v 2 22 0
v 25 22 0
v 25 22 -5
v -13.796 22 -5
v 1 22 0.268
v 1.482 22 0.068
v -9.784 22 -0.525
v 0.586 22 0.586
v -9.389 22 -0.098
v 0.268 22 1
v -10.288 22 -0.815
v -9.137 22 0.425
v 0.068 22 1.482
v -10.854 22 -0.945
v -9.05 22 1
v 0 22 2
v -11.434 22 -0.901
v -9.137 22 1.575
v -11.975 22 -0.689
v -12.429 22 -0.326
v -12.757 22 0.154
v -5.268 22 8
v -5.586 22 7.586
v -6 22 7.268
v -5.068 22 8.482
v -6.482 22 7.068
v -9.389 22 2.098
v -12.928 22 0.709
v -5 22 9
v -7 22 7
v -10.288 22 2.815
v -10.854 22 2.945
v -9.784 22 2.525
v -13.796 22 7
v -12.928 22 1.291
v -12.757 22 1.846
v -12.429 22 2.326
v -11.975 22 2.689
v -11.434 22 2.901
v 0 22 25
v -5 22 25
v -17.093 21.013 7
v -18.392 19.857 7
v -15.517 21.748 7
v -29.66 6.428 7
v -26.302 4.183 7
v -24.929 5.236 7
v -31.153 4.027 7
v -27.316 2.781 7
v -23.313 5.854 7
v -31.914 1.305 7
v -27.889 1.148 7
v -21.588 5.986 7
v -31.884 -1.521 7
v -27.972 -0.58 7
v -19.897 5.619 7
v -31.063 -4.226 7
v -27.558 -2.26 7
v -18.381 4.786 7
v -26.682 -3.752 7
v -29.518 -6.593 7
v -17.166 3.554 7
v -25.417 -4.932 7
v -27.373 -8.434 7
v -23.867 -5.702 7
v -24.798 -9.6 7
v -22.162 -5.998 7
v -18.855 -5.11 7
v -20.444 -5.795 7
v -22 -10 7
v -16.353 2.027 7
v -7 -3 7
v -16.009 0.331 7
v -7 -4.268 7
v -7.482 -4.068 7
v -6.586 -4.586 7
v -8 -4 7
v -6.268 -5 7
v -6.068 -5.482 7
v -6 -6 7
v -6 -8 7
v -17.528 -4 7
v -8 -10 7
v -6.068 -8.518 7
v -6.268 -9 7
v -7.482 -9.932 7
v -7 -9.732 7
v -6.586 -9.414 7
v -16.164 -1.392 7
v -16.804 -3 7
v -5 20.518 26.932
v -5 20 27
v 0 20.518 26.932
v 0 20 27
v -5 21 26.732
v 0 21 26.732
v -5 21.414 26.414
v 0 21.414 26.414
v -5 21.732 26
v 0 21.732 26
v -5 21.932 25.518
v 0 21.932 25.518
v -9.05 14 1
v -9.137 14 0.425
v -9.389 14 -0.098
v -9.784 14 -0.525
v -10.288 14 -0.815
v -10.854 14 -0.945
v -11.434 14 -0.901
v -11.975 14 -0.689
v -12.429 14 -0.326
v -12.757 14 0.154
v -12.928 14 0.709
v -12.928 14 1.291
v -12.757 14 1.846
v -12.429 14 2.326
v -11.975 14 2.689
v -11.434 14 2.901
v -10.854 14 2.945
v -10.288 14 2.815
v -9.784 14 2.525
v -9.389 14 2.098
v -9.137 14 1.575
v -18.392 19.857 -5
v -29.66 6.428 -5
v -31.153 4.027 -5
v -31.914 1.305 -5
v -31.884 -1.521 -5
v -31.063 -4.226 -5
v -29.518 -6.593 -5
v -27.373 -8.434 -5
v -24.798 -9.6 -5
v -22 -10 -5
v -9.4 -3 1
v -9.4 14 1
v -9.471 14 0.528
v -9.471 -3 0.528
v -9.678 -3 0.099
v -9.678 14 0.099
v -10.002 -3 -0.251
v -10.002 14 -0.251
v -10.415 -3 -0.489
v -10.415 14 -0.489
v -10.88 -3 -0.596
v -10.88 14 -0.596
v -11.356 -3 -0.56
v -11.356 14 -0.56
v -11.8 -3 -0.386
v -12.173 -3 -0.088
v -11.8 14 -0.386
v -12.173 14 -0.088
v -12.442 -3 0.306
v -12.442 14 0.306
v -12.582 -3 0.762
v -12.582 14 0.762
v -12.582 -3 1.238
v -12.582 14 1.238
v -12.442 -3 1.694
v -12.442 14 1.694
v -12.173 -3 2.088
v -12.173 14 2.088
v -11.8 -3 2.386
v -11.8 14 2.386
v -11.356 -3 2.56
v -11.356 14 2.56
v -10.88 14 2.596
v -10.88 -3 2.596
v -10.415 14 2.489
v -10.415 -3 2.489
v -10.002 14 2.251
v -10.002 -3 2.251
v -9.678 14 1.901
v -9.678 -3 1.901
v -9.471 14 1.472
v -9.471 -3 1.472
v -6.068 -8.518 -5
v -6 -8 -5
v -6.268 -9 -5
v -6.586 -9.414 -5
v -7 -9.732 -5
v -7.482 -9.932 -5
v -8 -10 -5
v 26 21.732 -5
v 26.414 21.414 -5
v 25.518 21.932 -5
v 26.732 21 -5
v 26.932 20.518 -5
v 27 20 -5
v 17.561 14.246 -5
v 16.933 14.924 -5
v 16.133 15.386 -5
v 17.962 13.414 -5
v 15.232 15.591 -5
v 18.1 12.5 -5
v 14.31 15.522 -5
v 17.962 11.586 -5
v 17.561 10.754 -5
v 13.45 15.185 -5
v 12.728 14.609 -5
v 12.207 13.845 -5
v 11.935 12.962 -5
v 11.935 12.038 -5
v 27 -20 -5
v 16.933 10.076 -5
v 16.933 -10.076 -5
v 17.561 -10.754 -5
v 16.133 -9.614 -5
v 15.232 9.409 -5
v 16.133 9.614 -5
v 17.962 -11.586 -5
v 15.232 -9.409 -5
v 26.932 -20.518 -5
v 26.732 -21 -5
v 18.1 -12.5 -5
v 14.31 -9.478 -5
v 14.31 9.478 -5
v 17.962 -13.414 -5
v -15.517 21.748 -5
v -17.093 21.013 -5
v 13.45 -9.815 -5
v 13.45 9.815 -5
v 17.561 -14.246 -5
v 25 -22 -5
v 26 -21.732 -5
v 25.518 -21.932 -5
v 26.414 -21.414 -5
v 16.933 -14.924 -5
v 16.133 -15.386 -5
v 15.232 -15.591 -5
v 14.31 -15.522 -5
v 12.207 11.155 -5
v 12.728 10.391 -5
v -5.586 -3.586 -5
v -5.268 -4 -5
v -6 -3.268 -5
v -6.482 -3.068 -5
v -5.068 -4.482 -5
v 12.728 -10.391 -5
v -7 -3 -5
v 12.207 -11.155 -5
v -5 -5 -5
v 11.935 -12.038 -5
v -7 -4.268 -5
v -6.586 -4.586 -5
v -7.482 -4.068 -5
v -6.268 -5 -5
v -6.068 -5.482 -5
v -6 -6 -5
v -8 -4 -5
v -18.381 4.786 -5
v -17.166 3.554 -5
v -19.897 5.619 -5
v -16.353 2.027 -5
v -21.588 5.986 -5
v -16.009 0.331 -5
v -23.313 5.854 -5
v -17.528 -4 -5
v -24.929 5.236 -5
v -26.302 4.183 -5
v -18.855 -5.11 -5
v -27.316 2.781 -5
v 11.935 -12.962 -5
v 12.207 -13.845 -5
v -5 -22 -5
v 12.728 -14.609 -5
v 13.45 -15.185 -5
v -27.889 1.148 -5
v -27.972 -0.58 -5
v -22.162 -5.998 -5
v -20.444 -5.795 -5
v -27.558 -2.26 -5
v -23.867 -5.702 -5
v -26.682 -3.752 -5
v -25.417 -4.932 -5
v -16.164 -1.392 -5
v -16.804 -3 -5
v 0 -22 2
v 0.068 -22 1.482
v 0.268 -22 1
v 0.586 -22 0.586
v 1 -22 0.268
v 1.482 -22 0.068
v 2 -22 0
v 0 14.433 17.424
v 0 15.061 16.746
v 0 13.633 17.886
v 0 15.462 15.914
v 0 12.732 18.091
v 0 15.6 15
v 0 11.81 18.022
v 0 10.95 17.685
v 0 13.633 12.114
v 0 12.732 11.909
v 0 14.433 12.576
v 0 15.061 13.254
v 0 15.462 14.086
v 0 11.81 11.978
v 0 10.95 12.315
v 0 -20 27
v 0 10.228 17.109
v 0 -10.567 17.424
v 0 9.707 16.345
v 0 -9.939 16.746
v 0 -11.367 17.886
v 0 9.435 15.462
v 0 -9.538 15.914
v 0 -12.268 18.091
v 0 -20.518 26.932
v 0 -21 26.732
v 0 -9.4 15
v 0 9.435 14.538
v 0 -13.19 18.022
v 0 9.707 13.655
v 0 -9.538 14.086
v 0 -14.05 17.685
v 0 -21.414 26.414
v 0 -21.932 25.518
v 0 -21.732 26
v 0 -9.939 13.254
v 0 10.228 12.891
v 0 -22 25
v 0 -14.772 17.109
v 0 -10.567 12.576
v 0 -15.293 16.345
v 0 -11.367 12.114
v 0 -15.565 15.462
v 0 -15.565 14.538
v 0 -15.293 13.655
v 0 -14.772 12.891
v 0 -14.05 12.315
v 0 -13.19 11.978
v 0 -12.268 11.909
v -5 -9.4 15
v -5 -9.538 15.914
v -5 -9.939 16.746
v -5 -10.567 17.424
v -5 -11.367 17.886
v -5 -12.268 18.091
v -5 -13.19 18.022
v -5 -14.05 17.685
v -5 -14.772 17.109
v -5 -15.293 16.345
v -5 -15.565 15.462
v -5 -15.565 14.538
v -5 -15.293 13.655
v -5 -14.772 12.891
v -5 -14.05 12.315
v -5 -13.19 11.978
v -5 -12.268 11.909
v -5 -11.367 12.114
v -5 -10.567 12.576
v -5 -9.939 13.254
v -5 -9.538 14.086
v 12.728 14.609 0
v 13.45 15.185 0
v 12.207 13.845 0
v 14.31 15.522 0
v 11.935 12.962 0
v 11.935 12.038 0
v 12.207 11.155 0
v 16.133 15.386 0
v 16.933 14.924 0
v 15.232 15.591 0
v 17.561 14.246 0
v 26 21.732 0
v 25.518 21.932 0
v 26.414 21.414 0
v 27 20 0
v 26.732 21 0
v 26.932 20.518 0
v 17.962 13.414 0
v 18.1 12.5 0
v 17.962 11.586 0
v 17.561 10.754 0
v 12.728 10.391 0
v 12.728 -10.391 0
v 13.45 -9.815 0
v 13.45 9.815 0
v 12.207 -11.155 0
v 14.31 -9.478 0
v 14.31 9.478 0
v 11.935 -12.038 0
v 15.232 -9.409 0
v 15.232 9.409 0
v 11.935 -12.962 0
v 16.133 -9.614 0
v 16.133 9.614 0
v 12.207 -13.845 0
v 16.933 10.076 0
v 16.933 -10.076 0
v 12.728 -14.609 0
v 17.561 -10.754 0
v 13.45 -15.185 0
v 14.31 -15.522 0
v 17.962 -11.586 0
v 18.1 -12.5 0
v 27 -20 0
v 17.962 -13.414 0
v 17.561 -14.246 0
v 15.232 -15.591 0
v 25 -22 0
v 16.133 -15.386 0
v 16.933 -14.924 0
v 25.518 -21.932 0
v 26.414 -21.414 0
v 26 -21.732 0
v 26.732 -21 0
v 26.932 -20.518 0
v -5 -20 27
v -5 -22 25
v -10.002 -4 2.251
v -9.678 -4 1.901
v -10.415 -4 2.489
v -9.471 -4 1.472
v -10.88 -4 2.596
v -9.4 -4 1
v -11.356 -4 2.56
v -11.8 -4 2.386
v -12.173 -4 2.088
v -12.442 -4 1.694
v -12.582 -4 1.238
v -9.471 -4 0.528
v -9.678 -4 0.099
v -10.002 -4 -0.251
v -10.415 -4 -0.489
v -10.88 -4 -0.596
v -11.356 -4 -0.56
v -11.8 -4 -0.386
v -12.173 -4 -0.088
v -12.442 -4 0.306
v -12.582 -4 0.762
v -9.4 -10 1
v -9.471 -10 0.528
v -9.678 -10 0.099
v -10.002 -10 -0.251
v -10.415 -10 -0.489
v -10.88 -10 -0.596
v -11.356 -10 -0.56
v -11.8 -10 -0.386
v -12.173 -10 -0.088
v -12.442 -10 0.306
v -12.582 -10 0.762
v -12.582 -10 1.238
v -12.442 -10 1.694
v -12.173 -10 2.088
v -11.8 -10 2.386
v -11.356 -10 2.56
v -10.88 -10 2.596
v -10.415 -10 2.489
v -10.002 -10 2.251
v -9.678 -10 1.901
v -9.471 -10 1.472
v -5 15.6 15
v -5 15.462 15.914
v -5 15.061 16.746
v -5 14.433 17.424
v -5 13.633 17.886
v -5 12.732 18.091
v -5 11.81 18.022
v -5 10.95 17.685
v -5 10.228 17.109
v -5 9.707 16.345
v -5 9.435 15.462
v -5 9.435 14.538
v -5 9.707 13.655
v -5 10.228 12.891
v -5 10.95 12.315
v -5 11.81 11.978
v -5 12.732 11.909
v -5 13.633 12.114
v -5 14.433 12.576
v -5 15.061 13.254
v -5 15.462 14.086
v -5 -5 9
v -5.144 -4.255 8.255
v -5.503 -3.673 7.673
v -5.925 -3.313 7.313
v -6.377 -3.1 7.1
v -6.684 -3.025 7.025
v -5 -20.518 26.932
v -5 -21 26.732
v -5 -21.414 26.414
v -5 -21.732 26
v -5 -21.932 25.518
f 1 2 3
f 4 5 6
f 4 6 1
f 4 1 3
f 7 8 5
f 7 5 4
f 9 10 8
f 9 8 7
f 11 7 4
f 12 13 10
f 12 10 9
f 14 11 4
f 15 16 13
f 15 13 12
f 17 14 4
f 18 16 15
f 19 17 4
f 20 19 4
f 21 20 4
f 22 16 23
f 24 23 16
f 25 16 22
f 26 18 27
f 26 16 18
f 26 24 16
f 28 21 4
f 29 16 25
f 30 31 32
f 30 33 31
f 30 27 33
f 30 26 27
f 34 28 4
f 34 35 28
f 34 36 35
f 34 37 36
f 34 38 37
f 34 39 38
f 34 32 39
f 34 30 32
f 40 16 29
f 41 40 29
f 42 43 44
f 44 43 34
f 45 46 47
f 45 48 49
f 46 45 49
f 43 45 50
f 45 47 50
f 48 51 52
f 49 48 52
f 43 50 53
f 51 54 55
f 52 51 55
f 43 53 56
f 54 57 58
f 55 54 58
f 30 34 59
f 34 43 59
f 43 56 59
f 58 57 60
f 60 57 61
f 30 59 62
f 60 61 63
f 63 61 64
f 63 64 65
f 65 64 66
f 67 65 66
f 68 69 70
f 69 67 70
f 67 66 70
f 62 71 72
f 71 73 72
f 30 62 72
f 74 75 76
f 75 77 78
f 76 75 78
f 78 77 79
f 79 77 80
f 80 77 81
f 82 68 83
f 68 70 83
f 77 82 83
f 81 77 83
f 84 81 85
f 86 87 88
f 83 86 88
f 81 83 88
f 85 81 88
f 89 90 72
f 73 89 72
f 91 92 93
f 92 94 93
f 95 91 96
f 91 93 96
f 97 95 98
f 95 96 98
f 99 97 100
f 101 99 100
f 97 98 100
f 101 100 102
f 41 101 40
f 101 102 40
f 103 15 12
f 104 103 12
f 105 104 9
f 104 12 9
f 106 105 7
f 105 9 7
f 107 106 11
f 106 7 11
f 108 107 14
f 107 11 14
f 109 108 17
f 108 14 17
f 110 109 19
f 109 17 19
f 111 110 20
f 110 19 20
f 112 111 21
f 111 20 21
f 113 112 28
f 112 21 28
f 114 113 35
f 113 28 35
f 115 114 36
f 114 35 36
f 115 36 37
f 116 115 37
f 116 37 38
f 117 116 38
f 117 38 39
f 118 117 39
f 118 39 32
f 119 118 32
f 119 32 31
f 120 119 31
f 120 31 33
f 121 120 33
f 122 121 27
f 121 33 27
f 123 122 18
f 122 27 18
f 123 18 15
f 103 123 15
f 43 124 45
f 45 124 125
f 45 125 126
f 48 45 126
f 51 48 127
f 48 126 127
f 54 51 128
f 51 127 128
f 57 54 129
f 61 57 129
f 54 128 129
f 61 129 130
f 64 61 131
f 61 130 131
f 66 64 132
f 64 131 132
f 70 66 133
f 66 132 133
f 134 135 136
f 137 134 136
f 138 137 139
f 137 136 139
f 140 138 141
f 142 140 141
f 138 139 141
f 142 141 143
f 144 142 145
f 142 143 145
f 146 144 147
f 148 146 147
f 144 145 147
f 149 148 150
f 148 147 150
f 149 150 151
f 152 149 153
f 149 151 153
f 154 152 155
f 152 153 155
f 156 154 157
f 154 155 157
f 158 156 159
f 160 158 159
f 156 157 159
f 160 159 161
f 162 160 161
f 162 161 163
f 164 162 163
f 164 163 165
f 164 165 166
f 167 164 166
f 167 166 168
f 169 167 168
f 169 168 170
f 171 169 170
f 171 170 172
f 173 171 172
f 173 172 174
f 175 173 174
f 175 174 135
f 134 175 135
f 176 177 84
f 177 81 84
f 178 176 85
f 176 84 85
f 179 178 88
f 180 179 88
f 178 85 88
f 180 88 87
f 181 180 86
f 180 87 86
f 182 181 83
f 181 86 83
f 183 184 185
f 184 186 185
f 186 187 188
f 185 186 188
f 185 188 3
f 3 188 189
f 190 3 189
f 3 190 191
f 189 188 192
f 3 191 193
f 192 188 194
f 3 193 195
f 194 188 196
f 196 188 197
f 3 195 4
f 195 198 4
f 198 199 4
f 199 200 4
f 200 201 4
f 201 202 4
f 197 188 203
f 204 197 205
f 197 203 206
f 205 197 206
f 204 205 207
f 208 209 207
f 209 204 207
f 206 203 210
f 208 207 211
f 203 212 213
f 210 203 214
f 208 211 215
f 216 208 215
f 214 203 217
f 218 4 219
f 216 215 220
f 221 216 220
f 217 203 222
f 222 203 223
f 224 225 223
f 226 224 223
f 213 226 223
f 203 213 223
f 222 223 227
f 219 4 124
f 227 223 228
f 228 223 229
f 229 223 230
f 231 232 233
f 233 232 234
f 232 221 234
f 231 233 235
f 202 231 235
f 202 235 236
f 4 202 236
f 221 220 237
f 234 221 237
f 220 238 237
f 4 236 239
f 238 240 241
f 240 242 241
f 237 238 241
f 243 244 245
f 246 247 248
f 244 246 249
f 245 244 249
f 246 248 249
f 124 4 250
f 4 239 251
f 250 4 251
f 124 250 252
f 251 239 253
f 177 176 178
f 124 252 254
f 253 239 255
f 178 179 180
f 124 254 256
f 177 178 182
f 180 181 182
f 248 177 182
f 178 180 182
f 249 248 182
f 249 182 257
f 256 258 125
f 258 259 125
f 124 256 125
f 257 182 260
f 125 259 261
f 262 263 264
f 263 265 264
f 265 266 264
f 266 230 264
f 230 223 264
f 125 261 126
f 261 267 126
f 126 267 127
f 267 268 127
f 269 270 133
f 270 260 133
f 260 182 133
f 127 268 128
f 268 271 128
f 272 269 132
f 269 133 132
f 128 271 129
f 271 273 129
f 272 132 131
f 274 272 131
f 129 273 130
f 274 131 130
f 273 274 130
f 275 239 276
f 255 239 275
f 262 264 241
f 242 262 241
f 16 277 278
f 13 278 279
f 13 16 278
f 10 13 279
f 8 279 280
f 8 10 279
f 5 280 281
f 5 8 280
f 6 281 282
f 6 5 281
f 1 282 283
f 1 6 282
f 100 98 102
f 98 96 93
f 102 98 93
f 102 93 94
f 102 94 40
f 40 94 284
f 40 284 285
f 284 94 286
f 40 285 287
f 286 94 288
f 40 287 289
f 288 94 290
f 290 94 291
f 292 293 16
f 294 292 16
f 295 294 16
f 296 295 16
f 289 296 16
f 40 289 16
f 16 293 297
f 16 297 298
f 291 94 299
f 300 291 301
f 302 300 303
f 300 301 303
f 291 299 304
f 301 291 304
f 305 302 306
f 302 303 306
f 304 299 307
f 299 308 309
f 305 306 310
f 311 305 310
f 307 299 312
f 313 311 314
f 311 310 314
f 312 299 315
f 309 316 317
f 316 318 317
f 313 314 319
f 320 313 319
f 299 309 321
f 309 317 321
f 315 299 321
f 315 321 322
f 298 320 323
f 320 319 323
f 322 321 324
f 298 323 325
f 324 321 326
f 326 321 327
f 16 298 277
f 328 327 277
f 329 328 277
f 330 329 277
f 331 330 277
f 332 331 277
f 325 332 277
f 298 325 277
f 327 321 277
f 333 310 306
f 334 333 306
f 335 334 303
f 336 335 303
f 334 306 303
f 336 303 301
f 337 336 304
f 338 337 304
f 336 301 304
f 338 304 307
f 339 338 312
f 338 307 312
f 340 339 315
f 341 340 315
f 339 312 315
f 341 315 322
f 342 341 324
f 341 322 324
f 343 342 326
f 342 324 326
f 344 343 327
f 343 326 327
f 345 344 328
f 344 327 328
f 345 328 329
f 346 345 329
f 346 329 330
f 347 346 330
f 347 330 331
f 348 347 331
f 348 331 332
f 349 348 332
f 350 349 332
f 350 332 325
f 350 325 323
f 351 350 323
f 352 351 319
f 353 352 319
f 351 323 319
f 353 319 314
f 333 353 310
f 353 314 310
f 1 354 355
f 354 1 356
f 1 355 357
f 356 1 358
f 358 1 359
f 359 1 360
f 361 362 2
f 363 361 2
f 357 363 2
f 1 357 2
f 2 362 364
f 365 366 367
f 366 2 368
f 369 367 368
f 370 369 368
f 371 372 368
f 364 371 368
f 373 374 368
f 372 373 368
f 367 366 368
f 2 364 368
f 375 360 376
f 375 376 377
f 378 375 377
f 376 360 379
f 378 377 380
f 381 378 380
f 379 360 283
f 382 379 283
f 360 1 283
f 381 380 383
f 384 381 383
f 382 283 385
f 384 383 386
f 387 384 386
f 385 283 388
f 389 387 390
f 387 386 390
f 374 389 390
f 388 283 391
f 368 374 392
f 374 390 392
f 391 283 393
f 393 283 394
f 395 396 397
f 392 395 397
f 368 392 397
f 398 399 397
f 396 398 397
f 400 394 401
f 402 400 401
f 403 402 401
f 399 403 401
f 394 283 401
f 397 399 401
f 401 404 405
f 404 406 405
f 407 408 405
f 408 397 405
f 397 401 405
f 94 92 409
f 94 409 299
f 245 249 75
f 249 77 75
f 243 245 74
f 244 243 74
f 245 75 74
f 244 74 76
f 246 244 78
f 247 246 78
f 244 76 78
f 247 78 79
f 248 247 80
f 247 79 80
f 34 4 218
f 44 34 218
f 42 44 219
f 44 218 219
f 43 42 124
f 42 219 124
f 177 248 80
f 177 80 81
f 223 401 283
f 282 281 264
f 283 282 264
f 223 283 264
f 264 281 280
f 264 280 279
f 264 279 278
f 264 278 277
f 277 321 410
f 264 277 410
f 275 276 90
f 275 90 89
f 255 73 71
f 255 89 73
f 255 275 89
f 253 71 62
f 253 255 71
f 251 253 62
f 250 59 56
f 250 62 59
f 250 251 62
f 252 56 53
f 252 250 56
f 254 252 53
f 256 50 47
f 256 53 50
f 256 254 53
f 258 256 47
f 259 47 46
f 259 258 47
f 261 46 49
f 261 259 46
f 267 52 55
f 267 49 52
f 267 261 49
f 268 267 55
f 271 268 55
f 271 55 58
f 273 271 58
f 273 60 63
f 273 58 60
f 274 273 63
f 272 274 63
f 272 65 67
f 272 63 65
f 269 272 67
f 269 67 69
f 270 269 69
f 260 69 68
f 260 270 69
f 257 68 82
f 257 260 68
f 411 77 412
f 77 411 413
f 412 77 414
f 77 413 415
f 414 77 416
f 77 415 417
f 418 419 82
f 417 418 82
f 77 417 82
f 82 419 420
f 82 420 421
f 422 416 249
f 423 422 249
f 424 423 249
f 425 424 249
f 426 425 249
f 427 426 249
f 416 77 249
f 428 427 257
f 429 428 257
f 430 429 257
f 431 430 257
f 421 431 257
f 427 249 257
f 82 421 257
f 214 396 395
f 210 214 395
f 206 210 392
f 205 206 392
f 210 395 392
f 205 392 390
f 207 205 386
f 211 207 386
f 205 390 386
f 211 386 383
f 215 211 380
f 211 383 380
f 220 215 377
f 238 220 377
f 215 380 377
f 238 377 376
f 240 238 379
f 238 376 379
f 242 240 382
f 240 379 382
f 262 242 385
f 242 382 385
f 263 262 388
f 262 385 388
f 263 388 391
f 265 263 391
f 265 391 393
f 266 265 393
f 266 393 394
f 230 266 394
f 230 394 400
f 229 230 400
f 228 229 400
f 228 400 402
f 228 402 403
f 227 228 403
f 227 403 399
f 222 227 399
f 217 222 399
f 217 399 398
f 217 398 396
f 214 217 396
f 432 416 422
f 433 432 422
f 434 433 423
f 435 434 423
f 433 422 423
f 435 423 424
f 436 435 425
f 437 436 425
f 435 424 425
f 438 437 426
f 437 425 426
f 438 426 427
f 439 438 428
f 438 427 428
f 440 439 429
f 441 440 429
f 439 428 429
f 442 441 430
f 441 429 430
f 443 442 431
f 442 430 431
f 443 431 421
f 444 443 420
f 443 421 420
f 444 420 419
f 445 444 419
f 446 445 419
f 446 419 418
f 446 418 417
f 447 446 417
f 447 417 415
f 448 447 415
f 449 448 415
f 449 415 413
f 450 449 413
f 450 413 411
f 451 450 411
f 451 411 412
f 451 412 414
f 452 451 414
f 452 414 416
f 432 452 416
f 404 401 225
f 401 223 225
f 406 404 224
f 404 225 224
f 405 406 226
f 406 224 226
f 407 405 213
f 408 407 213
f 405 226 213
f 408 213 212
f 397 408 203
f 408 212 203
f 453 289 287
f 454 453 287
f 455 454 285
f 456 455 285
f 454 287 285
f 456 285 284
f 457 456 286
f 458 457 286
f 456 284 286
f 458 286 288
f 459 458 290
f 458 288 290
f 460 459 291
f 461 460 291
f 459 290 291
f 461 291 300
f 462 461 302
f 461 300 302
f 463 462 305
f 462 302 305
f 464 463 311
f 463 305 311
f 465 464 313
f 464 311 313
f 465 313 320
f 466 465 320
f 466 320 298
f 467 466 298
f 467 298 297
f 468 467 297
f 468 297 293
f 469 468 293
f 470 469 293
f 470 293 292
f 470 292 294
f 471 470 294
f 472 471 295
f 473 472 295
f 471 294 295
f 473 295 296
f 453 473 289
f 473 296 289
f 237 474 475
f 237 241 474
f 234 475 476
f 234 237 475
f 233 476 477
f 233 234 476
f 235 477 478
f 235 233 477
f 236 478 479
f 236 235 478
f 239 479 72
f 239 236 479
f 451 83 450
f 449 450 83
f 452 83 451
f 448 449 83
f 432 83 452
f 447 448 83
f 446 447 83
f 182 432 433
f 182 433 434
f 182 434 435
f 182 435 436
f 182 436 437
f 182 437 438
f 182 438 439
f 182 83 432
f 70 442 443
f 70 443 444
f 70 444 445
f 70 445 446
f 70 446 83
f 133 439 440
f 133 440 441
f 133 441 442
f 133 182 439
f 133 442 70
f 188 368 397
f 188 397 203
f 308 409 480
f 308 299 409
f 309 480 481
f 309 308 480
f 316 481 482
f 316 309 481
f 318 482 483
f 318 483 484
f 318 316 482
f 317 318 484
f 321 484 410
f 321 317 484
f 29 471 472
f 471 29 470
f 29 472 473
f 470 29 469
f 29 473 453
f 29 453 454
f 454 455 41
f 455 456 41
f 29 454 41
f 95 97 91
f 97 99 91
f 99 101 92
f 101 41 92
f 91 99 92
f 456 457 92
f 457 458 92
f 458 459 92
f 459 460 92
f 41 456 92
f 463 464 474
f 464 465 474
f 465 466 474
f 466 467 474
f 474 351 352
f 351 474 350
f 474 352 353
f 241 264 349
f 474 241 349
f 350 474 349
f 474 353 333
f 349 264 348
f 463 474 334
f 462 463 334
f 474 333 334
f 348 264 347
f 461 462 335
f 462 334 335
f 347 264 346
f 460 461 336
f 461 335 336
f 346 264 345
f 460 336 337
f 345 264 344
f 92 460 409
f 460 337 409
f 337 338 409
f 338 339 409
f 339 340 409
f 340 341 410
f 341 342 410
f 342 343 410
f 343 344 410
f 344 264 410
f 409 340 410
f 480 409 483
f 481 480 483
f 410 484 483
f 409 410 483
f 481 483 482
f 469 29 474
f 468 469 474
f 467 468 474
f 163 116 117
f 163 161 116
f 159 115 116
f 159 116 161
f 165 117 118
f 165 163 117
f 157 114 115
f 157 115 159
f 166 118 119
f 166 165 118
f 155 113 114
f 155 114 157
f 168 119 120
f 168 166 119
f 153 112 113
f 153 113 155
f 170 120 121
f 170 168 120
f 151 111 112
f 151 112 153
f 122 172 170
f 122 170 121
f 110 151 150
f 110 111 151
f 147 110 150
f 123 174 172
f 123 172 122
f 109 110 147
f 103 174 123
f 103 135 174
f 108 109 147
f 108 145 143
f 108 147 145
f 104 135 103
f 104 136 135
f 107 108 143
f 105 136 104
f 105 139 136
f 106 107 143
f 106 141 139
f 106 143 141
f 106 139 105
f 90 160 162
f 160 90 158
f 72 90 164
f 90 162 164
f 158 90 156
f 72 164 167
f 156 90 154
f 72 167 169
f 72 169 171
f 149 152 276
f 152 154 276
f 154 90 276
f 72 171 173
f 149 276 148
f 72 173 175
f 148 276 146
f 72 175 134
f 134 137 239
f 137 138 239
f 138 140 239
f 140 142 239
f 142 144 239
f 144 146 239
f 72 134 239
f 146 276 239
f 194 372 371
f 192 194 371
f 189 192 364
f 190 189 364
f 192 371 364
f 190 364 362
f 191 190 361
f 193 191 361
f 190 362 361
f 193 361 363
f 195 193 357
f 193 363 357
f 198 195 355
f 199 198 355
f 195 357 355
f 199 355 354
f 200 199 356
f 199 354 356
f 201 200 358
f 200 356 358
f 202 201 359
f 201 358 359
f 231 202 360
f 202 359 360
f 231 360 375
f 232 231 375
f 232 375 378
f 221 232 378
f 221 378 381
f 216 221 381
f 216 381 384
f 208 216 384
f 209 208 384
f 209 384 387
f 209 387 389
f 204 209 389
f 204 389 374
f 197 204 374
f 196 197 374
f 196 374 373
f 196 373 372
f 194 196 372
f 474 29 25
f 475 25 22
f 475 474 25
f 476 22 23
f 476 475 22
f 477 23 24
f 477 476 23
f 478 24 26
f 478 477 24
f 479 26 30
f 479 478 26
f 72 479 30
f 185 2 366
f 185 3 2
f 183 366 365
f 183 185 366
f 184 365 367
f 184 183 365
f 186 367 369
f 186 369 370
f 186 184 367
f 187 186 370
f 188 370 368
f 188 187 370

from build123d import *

# Parameters (mm, degrees)
PAD_DEPTH         = 22
SKETCH001_R       = 3.1
POCKET_DEPTH      = 5.001
POCKET_DEPTH_BACK = -27.001
SKETCH002_R       = 3.1
POCKET001_DEPTH   = 5
SKETCH003_R       = 1.6
POCKET002_DEPTH   = 44.001
FILLET_R          = 2
SKETCH004_R       = 1.95
POCKET003_DEPTH   = 8


with BuildPart() as part:
    # Sketch → Pad (new body, symmetric)
    with BuildSketch(Plane.XZ):
        Polygon((0, 27), (0, 0), (27, 0), (27, -5), (-32, -5), (-32, 7), (-5, 7), (-5, 27), align=None)
    extrude(amount=PAD_DEPTH, both=True)

    # Sketch001 → Pocket (cut, two sides)
    with BuildSketch(Plane.XY) as pocket_sk:
        with Locations((15, 12.5)):
            Circle(SKETCH001_R)
        with Locations((15, -12.5)):
            Circle(SKETCH001_R)
        with BuildLine():
            ThreePointArc((-16.803848, -3), (-26.859933, 3.518672), (-17.527864, -4))
            Line((-6, -4), (-17.527864, -4))
            Line((-6, -4), (-6, -10))
            Line((-6, -10), (-22, -10))
            ThreePointArc((-29.660444, 6.427876), (-31.063078, -4.226183), (-22, -10))
            Line((-18.392302, 19.856726), (-29.660444, 6.427876))
            ThreePointArc((-13.796055, 22), (-16.331753, 21.437843), (-18.392302, 19.856726))
            Line((-13.796055, 22), (-13.796055, 28.799225))
            Line((-13.796055, 28.799225), (-40.339119, 28.799225))
            Line((-40.339119, 28.799225), (-40.339119, -28.958258))
            Line((-40.339119, -28.958258), (-5, -28.958258))
            Line((-5, -28.958258), (-5, -3))
            Line((-16.803848, -3), (-5, -3))
        make_face()
    extrude(amount=-POCKET_DEPTH, mode=Mode.SUBTRACT)
    extrude(pocket_sk.sketch, amount=-POCKET_DEPTH_BACK, mode=Mode.SUBTRACT)

    # Sketch002 → Pocket001 (cut)
    with BuildSketch(Plane.YZ):
        with Locations((-12.5, 15)):
            Circle(SKETCH002_R)
        with Locations((12.5, 15)):
            Circle(SKETCH002_R)
    extrude(amount=-POCKET001_DEPTH, mode=Mode.SUBTRACT)

    # Sketch003 (on Face5 of Pocket001) → Pocket002 (cut, through all)
    with BuildSketch(Plane(origin=(0, 22, 0), x_dir=(1, 0, 0), z_dir=(0, 1, 0))):
        with Locations((-11, -1)):
            Circle(SKETCH003_R)
    extrude(amount=-POCKET002_DEPTH, mode=Mode.SUBTRACT)

    # Fillet
    fillet_edges = [part.edges().sort_by_distance(p)[0] for p in [
        (-6, -4, 1),
        (-6, -10, 1),
        (-5, -3, 1),
        (-5, 9.5, 7),
        (27, -22, -2.5),
        (27, 22, -2.5),
        (0, 0, 0),
        (-2.5, -22, 27),
        (-2.5, 22, 27),
    ]]
    fillet(fillet_edges, radius=FILLET_R)

    # Sketch004 (on Face2 of Fillet) → Pocket003 (cut)
    with BuildSketch(Plane(origin=(0, 22, 0), x_dir=(1, 0, 0), z_dir=(0, 1, 0))):
        with Locations((-11, -1)):
            Circle(SKETCH004_R)
    extrude(amount=-POCKET003_DEPTH, mode=Mode.SUBTRACT)


solid = part.part
